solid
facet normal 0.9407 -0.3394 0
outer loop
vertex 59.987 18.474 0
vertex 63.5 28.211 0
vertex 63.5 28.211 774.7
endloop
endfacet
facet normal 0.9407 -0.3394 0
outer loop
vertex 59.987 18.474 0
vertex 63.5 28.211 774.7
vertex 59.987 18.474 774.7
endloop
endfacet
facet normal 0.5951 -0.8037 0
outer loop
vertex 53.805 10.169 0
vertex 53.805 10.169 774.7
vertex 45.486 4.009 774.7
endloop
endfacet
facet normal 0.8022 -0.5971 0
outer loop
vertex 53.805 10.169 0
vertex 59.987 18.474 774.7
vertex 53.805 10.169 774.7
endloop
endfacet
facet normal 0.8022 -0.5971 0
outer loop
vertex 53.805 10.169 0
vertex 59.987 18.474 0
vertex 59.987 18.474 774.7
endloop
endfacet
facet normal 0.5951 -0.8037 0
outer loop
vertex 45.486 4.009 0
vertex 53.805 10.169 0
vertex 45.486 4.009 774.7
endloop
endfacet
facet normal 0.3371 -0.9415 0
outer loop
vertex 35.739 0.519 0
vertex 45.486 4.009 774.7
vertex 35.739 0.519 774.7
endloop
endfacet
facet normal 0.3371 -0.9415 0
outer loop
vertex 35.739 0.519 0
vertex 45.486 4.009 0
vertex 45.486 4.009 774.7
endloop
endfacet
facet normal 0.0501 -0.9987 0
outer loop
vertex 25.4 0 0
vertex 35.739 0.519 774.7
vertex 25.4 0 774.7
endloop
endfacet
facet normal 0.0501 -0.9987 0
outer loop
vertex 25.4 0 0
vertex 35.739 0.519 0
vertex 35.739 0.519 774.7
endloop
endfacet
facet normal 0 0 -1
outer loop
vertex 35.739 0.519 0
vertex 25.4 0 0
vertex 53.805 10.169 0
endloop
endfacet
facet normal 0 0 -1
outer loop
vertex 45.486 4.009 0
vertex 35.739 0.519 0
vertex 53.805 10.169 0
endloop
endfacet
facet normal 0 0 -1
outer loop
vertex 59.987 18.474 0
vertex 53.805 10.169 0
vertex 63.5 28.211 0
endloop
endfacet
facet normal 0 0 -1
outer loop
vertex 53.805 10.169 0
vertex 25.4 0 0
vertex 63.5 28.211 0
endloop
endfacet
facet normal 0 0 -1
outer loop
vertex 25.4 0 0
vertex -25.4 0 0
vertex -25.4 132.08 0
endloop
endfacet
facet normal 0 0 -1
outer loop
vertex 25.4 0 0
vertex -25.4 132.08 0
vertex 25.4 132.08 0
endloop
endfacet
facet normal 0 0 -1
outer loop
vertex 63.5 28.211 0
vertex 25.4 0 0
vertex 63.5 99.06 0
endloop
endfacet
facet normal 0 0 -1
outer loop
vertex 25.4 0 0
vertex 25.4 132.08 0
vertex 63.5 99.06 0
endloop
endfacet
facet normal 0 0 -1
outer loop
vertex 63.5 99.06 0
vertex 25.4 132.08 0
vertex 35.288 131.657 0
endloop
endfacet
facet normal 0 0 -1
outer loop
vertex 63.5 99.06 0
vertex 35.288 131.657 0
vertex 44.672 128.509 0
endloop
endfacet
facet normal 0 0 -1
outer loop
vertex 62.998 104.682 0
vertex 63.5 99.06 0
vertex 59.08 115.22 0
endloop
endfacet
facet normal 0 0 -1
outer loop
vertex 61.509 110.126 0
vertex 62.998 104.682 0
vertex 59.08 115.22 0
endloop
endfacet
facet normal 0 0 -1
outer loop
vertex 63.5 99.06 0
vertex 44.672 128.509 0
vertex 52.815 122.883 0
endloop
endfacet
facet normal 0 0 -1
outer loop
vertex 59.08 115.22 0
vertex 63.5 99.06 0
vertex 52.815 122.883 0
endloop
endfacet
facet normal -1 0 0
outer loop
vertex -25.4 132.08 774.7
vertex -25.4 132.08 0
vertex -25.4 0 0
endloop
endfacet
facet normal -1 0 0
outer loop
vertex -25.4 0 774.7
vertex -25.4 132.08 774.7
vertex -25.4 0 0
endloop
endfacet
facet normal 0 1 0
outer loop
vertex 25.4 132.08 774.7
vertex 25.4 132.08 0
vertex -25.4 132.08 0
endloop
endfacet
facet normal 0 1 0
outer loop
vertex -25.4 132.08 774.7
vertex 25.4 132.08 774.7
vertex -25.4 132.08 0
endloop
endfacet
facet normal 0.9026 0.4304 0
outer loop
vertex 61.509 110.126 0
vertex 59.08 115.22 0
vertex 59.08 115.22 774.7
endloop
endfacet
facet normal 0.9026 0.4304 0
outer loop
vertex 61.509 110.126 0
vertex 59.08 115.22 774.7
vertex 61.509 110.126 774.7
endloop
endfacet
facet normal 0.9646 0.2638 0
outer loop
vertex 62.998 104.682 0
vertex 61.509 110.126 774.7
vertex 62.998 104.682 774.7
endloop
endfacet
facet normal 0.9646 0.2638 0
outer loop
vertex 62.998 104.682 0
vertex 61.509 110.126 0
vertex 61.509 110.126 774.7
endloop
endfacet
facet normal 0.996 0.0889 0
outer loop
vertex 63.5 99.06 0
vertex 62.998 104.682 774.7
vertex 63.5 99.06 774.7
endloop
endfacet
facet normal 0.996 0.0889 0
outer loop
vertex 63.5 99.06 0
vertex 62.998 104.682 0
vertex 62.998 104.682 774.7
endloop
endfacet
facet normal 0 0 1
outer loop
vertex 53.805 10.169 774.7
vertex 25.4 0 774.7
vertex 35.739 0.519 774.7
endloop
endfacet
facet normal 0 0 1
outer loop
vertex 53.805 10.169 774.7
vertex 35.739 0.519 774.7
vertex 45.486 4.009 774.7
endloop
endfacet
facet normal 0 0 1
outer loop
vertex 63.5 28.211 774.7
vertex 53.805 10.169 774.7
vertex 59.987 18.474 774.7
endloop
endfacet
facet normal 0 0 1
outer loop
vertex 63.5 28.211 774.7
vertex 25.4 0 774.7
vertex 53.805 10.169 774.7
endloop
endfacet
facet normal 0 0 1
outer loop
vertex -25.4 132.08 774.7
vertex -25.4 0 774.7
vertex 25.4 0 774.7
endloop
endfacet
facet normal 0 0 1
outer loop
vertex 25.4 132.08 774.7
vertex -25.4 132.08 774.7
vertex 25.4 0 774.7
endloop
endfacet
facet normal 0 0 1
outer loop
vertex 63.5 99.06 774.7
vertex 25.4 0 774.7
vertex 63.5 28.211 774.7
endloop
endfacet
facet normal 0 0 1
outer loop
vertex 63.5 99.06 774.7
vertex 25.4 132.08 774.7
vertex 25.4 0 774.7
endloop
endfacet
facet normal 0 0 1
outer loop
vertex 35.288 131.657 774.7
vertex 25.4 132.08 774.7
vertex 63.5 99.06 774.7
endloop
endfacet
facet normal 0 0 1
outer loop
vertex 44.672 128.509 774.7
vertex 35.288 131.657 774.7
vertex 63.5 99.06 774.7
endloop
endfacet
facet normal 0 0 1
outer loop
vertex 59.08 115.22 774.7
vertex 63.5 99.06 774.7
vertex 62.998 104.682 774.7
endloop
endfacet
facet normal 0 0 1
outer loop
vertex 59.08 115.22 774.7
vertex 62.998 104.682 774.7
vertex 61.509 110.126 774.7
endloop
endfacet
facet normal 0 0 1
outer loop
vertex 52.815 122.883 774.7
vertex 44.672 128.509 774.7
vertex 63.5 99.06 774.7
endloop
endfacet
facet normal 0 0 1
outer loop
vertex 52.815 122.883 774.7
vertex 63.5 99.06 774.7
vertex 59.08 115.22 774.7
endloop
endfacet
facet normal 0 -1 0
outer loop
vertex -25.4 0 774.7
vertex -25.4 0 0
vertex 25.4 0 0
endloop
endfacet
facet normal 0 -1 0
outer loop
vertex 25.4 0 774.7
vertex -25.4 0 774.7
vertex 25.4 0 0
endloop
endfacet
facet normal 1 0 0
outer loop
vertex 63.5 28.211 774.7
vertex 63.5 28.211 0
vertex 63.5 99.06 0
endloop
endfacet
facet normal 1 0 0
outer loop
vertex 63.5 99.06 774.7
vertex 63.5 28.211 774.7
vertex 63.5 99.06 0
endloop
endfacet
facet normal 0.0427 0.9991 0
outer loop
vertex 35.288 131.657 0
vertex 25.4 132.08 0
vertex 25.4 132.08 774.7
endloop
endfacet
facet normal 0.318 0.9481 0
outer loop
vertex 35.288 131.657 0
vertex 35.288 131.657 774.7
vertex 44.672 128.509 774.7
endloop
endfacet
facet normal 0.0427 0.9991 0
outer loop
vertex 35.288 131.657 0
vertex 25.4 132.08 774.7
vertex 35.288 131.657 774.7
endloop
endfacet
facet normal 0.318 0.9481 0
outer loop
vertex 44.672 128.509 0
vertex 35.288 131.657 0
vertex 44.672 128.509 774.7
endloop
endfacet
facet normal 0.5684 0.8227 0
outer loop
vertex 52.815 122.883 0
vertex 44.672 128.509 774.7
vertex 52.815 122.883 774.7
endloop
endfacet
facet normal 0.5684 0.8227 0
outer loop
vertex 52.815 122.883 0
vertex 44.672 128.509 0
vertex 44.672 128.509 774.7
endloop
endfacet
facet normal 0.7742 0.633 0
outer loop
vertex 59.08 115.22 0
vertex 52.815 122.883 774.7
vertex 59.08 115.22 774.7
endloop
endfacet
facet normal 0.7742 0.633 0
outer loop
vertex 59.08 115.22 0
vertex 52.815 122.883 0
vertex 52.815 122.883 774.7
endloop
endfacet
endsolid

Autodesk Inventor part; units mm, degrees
ref_plane "YZ Plane" through (0, 0, 0) normal (1, 0, 0) x (0, 1, 0)
ref_plane "XZ Plane" through (0, 0, 0) normal (0, 1, 0) x (-1, 0, 0)
ref_plane "XY Plane" through (0, 0, 0) normal (0, 0, 1) x (1, 0, 0)
sketch "Sketch1" plane through (0, 0, 0) normal (0, 0, 1) x (1, 0, 0)
  line L0 (0, 0) -> (0, 132.08)
  line L1 (0, 132.08) -> (25.4, 132.08)
  line L2 (0, 66.04) -> (63.5, 66.04)
  line L3 (0, 132.08) -> (0, 66.04)
  line L4 (0, 99.06) -> (31.75, 99.06)
  arc A0 (63.5, 99.06) -> (55.043838, 120.634513) centre (31.75, 99.06) ccw
  line L5 (0, 66.04) -> (0, 0)
  arc A1 (54.194148, 10.562869) -> (63.5, 33.02) centre (31.75, 33.02) ccw
  line L6 (63.5, 28.211314) -> (63.5, 99.06)
  arc A2 (59.079555, 115.220381) -> (25.4, 132.08) centre (28.846947, 96.896052) ccw
  line L7 (0, 0) -> (25.4, 0)
  arc A3 (25.4, 0) -> (63.5, 28.211314) centre (28.813006, 35.223762) ccw
  line L8 (0, 132.08) -> (-25.4, 132.08)
  line L9 (0, 1.27) -> (0, 132.08)
  line L10 (0, 132.08) -> (-25.4, 132.08)
  line L11 (-25.4, 132.08) -> (-25.4, 1.27)
  line L12 (-25.4, 0) -> (0, 0)
  line L13 (0, 0) -> (0, 132.08)
  line L14 (0, 132.08) -> (-25.4, 132.08)
  line L15 (-25.4, 132.08) -> (-25.4, 0)
  dimension "d0" = 132.08
  dimension "d1" = 25.4
  dimension "d2" = 63.5
  dimension "d3" = 25.4
  dimension "d4" = 25.4
sketch "Sketch1 outline for Extrusion1" plane through (0, 0, 0) normal (0, 0, 1) x (1, 0, 0)
  line L0 (-25.4, 0) -> (25.4, 0)
  arc A0 (25.4, 0) -> (63.5, 28.211314) centre (28.813006, 35.223762) ccw
  line L1 (63.5, 28.211314) -> (63.5, 99.06)
  arc A1 (63.5, 99.06) -> (59.079555, 115.220381) centre (31.75, 99.06) ccw
  arc A2 (59.079555, 115.220381) -> (25.4, 132.08) centre (28.846947, 96.896052) ccw
  line L2 (25.4, 132.08) -> (-25.4, 132.08)
  line L3 (-25.4, 132.08) -> (-25.4, 0)
extrude "Extrusion1" add sketch "Sketch1 outline for Extrusion1" along normal blind 774.7
properties part number "Chassis_Bumper(29in)"
